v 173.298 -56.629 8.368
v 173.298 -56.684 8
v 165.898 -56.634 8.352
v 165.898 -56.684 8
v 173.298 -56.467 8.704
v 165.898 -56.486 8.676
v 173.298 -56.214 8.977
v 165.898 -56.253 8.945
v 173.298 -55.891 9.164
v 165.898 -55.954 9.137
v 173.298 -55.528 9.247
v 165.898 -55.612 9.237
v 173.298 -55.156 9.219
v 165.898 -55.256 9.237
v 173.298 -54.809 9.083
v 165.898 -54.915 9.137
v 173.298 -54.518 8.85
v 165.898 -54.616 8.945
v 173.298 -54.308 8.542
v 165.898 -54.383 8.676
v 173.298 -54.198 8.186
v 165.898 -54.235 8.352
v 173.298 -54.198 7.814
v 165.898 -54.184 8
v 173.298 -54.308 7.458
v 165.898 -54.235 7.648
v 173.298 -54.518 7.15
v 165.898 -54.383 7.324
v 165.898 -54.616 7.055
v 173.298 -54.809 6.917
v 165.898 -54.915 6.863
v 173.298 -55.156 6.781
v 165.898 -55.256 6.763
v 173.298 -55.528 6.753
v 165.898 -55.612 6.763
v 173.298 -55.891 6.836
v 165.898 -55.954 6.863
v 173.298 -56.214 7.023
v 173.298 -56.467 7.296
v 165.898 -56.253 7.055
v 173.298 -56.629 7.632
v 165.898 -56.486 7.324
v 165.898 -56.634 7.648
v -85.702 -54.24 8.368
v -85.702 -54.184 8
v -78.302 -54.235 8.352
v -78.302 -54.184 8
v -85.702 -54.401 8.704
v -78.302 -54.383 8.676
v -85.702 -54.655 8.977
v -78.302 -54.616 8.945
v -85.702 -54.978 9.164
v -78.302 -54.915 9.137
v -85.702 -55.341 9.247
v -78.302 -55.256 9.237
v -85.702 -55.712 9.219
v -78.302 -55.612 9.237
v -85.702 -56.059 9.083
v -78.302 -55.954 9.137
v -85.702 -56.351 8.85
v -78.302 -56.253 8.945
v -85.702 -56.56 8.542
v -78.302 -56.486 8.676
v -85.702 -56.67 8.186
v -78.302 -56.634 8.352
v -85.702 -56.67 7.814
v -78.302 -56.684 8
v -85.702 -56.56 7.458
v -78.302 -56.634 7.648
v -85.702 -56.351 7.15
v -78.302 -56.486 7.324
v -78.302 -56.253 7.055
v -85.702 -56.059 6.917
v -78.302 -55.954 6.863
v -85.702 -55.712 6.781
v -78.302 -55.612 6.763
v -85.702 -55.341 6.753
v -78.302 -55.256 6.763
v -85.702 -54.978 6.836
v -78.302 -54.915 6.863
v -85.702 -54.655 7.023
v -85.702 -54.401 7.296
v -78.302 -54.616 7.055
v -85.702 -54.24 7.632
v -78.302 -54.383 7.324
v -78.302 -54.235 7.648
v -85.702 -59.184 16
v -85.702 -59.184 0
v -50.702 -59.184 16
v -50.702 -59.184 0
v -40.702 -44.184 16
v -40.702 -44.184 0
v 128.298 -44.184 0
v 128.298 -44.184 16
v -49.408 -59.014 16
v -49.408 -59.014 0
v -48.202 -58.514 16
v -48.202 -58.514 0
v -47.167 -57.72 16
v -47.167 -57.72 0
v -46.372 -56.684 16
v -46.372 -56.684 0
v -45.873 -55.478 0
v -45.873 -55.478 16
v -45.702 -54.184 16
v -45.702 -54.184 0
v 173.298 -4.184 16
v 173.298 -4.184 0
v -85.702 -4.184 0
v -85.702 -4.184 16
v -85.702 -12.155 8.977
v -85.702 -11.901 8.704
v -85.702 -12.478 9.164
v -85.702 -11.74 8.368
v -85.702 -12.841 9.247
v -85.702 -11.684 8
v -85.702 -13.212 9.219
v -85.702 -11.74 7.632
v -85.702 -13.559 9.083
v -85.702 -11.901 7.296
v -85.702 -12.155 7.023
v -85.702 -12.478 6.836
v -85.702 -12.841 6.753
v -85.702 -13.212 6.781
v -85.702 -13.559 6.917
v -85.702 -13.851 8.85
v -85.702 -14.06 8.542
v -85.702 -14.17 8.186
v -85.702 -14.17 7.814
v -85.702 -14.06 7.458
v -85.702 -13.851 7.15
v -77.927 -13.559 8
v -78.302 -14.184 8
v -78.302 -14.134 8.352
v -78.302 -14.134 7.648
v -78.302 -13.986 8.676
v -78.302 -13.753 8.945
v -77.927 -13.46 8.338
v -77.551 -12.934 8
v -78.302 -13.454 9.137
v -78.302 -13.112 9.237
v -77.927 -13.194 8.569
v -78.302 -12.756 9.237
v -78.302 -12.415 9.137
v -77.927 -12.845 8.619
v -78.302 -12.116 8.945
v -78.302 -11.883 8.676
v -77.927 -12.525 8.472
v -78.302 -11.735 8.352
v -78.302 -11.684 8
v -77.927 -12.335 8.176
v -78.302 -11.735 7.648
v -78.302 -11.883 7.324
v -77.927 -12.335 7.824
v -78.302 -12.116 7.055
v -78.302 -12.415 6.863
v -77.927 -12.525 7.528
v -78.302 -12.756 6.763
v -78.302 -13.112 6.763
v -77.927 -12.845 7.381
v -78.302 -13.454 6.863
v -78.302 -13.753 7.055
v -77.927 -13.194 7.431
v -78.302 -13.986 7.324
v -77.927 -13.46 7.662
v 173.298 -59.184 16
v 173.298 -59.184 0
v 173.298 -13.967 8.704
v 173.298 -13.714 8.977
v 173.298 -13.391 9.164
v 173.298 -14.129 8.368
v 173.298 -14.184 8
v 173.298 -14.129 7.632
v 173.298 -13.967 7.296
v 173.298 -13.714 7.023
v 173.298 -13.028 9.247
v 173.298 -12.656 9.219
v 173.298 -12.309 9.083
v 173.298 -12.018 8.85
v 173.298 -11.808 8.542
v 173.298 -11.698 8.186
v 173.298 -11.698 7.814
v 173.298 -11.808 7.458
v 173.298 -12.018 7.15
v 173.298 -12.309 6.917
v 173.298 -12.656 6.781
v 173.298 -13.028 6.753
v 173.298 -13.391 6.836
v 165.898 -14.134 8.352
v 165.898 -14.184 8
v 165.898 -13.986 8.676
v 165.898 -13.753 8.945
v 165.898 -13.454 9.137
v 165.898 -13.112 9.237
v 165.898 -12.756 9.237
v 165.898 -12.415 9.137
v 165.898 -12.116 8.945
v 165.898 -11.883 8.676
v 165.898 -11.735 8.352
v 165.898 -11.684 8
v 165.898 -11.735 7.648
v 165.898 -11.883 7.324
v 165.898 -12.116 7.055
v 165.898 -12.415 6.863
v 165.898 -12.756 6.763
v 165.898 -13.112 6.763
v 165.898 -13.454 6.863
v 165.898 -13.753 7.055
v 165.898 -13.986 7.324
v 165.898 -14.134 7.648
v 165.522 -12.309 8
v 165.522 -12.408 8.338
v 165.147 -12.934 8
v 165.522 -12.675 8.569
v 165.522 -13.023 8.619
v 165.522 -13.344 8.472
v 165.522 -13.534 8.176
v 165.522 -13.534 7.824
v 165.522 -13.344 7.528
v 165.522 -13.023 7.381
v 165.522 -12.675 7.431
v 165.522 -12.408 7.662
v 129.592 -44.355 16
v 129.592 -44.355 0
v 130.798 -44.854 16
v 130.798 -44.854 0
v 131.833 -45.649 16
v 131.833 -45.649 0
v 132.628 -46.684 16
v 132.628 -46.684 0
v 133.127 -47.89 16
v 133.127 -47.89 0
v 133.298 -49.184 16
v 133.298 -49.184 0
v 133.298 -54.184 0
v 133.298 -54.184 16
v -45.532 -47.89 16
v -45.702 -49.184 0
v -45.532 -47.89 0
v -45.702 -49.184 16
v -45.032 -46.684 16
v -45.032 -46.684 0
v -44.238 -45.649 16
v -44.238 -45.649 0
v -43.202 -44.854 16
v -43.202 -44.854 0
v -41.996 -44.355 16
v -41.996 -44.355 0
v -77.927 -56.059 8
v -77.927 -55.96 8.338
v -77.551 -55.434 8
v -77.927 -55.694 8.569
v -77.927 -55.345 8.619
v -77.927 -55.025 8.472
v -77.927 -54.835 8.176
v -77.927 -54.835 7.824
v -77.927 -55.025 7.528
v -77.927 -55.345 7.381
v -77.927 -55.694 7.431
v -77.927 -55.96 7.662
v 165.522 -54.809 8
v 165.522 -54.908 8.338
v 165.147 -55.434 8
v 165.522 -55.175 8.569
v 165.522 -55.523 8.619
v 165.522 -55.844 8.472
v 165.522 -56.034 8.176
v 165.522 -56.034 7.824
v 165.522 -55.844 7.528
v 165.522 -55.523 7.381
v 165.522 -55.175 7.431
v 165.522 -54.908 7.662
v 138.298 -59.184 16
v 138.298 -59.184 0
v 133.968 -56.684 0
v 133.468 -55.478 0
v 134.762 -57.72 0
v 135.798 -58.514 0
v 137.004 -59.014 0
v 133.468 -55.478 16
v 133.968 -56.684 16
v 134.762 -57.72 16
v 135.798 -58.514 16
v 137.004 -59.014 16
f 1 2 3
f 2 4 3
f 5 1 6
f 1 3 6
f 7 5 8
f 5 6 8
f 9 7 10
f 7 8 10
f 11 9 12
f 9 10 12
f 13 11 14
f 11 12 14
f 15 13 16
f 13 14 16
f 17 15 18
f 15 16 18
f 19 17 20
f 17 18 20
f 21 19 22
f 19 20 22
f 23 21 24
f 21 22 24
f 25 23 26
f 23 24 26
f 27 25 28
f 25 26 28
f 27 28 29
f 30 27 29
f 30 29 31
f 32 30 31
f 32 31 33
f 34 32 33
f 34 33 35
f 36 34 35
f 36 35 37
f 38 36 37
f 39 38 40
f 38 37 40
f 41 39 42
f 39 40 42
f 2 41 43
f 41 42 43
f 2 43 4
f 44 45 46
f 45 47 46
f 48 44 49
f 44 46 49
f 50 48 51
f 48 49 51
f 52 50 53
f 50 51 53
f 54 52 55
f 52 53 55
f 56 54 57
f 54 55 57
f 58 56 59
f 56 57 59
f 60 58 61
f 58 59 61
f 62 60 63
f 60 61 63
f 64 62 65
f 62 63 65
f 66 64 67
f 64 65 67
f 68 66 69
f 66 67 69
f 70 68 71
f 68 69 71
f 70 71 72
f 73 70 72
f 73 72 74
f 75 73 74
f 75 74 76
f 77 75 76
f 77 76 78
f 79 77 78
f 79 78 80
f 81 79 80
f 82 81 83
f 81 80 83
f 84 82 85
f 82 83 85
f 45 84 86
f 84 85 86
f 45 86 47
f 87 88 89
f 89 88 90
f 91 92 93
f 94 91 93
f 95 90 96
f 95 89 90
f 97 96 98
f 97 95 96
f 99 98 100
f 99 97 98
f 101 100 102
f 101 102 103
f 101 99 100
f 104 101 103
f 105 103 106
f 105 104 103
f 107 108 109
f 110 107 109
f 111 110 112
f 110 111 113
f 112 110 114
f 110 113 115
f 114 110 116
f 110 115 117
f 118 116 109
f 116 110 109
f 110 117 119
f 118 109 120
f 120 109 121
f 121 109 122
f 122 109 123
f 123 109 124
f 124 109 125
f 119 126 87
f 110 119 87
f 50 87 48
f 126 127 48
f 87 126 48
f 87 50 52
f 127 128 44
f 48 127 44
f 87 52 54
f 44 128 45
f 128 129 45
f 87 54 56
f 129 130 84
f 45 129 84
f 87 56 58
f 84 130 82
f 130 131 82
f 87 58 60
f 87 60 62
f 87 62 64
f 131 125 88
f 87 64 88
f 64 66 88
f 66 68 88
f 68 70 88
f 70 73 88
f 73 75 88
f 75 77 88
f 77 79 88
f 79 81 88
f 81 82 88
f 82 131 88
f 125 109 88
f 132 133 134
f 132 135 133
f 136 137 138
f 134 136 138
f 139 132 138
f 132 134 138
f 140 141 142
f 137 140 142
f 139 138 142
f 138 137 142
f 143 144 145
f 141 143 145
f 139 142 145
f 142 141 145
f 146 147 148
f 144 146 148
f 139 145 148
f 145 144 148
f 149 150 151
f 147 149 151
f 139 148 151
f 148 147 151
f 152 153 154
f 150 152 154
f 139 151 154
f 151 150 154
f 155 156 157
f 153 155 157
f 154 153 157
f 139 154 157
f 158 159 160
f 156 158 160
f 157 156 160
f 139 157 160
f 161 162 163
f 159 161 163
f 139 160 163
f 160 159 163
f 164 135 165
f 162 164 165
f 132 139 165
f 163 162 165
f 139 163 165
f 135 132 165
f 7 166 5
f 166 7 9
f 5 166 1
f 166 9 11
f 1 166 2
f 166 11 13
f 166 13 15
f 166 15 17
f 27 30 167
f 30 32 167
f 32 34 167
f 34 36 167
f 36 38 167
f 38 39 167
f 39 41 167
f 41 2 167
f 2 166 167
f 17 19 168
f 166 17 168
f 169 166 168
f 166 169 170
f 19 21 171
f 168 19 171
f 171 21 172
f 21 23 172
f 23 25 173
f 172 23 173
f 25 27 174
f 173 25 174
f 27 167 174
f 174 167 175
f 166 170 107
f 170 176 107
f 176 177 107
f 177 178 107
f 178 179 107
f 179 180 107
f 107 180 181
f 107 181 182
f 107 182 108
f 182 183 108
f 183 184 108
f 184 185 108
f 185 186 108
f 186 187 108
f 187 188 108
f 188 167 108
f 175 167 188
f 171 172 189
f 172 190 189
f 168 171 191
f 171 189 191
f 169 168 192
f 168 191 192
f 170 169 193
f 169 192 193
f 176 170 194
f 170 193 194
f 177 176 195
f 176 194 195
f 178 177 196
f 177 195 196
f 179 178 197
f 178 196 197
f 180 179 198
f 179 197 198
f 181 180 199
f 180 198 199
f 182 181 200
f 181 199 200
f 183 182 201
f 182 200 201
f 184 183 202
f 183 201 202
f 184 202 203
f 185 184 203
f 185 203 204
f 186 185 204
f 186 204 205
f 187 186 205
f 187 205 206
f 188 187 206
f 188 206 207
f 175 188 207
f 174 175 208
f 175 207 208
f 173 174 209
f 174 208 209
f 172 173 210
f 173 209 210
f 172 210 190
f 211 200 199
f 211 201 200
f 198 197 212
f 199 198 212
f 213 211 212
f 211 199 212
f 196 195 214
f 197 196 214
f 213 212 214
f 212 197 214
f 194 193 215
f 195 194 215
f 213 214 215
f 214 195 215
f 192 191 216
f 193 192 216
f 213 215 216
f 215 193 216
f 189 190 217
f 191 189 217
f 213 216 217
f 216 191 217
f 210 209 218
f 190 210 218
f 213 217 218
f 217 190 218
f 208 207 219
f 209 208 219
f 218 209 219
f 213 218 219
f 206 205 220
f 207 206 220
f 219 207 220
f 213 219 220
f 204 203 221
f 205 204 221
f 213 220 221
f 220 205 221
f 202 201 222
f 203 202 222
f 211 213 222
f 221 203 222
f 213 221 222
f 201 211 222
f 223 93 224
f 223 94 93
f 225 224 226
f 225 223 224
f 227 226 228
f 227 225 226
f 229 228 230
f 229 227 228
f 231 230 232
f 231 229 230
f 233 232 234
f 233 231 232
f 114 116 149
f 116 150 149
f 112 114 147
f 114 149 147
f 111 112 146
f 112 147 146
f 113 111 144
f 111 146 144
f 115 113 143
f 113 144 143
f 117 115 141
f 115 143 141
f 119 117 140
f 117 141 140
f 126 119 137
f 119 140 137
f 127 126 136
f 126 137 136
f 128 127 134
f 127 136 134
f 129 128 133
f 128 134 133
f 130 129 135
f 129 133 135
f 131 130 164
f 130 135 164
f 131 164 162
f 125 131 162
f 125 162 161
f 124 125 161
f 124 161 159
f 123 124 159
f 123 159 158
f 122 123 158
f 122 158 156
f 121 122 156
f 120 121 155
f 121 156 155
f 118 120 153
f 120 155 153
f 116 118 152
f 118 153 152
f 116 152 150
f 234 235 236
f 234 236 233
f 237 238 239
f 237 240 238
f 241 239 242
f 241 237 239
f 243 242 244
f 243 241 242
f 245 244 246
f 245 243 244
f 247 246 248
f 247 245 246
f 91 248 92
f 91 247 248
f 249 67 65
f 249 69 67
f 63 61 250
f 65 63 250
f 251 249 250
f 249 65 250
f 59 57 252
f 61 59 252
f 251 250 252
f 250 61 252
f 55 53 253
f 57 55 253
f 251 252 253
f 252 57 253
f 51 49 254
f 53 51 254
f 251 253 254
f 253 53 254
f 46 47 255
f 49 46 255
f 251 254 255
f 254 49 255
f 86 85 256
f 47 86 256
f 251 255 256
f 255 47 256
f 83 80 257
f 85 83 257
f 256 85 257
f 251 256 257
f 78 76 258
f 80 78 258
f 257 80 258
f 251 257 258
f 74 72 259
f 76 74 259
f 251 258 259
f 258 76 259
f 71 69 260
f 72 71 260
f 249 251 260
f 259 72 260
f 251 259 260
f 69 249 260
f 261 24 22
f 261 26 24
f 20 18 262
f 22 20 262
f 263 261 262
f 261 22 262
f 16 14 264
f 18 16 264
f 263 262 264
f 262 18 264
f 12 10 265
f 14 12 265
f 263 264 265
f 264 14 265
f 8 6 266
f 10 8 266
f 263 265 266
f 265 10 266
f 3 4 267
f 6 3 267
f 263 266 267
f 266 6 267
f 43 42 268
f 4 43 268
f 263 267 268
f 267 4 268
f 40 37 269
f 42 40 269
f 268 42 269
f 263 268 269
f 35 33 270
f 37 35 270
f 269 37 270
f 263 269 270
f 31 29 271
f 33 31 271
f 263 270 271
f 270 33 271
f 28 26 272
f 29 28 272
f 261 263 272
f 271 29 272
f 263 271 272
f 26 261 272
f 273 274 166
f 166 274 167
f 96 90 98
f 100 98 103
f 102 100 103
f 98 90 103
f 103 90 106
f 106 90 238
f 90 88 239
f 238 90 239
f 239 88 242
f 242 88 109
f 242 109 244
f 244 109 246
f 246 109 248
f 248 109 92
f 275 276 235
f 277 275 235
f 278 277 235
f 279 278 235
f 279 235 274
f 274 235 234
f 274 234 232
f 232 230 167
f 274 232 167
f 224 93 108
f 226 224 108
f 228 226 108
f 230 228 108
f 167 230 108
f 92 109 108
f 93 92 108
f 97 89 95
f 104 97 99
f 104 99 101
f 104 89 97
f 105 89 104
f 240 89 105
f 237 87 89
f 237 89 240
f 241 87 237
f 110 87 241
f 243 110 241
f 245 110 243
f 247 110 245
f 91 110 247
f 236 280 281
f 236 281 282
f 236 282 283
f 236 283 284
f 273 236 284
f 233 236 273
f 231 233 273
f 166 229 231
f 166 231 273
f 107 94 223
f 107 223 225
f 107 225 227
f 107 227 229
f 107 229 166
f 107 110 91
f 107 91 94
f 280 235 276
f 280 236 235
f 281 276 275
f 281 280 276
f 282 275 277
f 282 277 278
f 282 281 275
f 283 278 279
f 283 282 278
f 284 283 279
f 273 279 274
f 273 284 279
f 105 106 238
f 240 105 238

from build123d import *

# Parameters (mm, degrees)
F0_W           = 40
F0_H           = 15
F1_DEPTH       = 16
F2_R           = 5
F5_D           = 2.5
F5_DEPTH       = 7.4
F5_TIP         = 0.7510757738
F5_ON_F4_D     = 2.5
F5_ON_F4_DEPTH = 7.4
F5_ON_F4_TIP   = 0.7510757738


with BuildPart() as f1:
    # F0 (on Top) → F1 (new body)
    with BuildSketch(Plane.XY):
        Polygon((173.2976804376, -4.1842792928), (-85.7023195624, -4.1842792928), (-85.7023195624, -44.1842792928), (-45.7023195624, -44.1842792928), (133.2976804376, -44.1842792928), (173.2976804376, -44.1842792928), align=None)
        with Locations((-65.7023195624, -51.6842792928)):
            Rectangle(F0_W, F0_H)
        with Locations((153.2976804376, -51.6842792928)):
            Rectangle(F0_W, F0_H)
    extrude(amount=F1_DEPTH)

    # F2
    f2_edges = [f1.edges().sort_by_distance(p)[0] for p in [
        (-45.70232, -59.184279, 8),
        (133.29768, -59.184279, 8),
        (133.29768, -44.184279, 8),
        (-45.70232, -44.184279, 8),
    ]]
    fillet(f2_edges, radius=F2_R)

    # F5
    with Locations(Plane(origin=(-85.7023195624, 0, 0), x_dir=(0, -1, 0), z_dir=(-1, 0, 0))):
        with Locations((12.9342792928, 8), (55.4342792928, 8)):
            Hole(F5_D / 2, depth=F5_DEPTH)
            with Locations((0, 0, -(F5_DEPTH + F5_TIP / 2))):  # 118° drill point
                Cone(0, F5_D / 2, F5_TIP, mode=Mode.SUBTRACT)

    # F5 on F4
    with Locations(Plane.YZ.offset(173.2976804376)):
        with Locations((-12.9342792928, 8), (-55.4342792928, 8)):
            Hole(F5_ON_F4_D / 2, depth=F5_ON_F4_DEPTH)
            with Locations((0, 0, -(F5_ON_F4_DEPTH + F5_ON_F4_TIP / 2))):  # 118° drill point
                Cone(0, F5_ON_F4_D / 2, F5_ON_F4_TIP, mode=Mode.SUBTRACT)


solid = f1.part
